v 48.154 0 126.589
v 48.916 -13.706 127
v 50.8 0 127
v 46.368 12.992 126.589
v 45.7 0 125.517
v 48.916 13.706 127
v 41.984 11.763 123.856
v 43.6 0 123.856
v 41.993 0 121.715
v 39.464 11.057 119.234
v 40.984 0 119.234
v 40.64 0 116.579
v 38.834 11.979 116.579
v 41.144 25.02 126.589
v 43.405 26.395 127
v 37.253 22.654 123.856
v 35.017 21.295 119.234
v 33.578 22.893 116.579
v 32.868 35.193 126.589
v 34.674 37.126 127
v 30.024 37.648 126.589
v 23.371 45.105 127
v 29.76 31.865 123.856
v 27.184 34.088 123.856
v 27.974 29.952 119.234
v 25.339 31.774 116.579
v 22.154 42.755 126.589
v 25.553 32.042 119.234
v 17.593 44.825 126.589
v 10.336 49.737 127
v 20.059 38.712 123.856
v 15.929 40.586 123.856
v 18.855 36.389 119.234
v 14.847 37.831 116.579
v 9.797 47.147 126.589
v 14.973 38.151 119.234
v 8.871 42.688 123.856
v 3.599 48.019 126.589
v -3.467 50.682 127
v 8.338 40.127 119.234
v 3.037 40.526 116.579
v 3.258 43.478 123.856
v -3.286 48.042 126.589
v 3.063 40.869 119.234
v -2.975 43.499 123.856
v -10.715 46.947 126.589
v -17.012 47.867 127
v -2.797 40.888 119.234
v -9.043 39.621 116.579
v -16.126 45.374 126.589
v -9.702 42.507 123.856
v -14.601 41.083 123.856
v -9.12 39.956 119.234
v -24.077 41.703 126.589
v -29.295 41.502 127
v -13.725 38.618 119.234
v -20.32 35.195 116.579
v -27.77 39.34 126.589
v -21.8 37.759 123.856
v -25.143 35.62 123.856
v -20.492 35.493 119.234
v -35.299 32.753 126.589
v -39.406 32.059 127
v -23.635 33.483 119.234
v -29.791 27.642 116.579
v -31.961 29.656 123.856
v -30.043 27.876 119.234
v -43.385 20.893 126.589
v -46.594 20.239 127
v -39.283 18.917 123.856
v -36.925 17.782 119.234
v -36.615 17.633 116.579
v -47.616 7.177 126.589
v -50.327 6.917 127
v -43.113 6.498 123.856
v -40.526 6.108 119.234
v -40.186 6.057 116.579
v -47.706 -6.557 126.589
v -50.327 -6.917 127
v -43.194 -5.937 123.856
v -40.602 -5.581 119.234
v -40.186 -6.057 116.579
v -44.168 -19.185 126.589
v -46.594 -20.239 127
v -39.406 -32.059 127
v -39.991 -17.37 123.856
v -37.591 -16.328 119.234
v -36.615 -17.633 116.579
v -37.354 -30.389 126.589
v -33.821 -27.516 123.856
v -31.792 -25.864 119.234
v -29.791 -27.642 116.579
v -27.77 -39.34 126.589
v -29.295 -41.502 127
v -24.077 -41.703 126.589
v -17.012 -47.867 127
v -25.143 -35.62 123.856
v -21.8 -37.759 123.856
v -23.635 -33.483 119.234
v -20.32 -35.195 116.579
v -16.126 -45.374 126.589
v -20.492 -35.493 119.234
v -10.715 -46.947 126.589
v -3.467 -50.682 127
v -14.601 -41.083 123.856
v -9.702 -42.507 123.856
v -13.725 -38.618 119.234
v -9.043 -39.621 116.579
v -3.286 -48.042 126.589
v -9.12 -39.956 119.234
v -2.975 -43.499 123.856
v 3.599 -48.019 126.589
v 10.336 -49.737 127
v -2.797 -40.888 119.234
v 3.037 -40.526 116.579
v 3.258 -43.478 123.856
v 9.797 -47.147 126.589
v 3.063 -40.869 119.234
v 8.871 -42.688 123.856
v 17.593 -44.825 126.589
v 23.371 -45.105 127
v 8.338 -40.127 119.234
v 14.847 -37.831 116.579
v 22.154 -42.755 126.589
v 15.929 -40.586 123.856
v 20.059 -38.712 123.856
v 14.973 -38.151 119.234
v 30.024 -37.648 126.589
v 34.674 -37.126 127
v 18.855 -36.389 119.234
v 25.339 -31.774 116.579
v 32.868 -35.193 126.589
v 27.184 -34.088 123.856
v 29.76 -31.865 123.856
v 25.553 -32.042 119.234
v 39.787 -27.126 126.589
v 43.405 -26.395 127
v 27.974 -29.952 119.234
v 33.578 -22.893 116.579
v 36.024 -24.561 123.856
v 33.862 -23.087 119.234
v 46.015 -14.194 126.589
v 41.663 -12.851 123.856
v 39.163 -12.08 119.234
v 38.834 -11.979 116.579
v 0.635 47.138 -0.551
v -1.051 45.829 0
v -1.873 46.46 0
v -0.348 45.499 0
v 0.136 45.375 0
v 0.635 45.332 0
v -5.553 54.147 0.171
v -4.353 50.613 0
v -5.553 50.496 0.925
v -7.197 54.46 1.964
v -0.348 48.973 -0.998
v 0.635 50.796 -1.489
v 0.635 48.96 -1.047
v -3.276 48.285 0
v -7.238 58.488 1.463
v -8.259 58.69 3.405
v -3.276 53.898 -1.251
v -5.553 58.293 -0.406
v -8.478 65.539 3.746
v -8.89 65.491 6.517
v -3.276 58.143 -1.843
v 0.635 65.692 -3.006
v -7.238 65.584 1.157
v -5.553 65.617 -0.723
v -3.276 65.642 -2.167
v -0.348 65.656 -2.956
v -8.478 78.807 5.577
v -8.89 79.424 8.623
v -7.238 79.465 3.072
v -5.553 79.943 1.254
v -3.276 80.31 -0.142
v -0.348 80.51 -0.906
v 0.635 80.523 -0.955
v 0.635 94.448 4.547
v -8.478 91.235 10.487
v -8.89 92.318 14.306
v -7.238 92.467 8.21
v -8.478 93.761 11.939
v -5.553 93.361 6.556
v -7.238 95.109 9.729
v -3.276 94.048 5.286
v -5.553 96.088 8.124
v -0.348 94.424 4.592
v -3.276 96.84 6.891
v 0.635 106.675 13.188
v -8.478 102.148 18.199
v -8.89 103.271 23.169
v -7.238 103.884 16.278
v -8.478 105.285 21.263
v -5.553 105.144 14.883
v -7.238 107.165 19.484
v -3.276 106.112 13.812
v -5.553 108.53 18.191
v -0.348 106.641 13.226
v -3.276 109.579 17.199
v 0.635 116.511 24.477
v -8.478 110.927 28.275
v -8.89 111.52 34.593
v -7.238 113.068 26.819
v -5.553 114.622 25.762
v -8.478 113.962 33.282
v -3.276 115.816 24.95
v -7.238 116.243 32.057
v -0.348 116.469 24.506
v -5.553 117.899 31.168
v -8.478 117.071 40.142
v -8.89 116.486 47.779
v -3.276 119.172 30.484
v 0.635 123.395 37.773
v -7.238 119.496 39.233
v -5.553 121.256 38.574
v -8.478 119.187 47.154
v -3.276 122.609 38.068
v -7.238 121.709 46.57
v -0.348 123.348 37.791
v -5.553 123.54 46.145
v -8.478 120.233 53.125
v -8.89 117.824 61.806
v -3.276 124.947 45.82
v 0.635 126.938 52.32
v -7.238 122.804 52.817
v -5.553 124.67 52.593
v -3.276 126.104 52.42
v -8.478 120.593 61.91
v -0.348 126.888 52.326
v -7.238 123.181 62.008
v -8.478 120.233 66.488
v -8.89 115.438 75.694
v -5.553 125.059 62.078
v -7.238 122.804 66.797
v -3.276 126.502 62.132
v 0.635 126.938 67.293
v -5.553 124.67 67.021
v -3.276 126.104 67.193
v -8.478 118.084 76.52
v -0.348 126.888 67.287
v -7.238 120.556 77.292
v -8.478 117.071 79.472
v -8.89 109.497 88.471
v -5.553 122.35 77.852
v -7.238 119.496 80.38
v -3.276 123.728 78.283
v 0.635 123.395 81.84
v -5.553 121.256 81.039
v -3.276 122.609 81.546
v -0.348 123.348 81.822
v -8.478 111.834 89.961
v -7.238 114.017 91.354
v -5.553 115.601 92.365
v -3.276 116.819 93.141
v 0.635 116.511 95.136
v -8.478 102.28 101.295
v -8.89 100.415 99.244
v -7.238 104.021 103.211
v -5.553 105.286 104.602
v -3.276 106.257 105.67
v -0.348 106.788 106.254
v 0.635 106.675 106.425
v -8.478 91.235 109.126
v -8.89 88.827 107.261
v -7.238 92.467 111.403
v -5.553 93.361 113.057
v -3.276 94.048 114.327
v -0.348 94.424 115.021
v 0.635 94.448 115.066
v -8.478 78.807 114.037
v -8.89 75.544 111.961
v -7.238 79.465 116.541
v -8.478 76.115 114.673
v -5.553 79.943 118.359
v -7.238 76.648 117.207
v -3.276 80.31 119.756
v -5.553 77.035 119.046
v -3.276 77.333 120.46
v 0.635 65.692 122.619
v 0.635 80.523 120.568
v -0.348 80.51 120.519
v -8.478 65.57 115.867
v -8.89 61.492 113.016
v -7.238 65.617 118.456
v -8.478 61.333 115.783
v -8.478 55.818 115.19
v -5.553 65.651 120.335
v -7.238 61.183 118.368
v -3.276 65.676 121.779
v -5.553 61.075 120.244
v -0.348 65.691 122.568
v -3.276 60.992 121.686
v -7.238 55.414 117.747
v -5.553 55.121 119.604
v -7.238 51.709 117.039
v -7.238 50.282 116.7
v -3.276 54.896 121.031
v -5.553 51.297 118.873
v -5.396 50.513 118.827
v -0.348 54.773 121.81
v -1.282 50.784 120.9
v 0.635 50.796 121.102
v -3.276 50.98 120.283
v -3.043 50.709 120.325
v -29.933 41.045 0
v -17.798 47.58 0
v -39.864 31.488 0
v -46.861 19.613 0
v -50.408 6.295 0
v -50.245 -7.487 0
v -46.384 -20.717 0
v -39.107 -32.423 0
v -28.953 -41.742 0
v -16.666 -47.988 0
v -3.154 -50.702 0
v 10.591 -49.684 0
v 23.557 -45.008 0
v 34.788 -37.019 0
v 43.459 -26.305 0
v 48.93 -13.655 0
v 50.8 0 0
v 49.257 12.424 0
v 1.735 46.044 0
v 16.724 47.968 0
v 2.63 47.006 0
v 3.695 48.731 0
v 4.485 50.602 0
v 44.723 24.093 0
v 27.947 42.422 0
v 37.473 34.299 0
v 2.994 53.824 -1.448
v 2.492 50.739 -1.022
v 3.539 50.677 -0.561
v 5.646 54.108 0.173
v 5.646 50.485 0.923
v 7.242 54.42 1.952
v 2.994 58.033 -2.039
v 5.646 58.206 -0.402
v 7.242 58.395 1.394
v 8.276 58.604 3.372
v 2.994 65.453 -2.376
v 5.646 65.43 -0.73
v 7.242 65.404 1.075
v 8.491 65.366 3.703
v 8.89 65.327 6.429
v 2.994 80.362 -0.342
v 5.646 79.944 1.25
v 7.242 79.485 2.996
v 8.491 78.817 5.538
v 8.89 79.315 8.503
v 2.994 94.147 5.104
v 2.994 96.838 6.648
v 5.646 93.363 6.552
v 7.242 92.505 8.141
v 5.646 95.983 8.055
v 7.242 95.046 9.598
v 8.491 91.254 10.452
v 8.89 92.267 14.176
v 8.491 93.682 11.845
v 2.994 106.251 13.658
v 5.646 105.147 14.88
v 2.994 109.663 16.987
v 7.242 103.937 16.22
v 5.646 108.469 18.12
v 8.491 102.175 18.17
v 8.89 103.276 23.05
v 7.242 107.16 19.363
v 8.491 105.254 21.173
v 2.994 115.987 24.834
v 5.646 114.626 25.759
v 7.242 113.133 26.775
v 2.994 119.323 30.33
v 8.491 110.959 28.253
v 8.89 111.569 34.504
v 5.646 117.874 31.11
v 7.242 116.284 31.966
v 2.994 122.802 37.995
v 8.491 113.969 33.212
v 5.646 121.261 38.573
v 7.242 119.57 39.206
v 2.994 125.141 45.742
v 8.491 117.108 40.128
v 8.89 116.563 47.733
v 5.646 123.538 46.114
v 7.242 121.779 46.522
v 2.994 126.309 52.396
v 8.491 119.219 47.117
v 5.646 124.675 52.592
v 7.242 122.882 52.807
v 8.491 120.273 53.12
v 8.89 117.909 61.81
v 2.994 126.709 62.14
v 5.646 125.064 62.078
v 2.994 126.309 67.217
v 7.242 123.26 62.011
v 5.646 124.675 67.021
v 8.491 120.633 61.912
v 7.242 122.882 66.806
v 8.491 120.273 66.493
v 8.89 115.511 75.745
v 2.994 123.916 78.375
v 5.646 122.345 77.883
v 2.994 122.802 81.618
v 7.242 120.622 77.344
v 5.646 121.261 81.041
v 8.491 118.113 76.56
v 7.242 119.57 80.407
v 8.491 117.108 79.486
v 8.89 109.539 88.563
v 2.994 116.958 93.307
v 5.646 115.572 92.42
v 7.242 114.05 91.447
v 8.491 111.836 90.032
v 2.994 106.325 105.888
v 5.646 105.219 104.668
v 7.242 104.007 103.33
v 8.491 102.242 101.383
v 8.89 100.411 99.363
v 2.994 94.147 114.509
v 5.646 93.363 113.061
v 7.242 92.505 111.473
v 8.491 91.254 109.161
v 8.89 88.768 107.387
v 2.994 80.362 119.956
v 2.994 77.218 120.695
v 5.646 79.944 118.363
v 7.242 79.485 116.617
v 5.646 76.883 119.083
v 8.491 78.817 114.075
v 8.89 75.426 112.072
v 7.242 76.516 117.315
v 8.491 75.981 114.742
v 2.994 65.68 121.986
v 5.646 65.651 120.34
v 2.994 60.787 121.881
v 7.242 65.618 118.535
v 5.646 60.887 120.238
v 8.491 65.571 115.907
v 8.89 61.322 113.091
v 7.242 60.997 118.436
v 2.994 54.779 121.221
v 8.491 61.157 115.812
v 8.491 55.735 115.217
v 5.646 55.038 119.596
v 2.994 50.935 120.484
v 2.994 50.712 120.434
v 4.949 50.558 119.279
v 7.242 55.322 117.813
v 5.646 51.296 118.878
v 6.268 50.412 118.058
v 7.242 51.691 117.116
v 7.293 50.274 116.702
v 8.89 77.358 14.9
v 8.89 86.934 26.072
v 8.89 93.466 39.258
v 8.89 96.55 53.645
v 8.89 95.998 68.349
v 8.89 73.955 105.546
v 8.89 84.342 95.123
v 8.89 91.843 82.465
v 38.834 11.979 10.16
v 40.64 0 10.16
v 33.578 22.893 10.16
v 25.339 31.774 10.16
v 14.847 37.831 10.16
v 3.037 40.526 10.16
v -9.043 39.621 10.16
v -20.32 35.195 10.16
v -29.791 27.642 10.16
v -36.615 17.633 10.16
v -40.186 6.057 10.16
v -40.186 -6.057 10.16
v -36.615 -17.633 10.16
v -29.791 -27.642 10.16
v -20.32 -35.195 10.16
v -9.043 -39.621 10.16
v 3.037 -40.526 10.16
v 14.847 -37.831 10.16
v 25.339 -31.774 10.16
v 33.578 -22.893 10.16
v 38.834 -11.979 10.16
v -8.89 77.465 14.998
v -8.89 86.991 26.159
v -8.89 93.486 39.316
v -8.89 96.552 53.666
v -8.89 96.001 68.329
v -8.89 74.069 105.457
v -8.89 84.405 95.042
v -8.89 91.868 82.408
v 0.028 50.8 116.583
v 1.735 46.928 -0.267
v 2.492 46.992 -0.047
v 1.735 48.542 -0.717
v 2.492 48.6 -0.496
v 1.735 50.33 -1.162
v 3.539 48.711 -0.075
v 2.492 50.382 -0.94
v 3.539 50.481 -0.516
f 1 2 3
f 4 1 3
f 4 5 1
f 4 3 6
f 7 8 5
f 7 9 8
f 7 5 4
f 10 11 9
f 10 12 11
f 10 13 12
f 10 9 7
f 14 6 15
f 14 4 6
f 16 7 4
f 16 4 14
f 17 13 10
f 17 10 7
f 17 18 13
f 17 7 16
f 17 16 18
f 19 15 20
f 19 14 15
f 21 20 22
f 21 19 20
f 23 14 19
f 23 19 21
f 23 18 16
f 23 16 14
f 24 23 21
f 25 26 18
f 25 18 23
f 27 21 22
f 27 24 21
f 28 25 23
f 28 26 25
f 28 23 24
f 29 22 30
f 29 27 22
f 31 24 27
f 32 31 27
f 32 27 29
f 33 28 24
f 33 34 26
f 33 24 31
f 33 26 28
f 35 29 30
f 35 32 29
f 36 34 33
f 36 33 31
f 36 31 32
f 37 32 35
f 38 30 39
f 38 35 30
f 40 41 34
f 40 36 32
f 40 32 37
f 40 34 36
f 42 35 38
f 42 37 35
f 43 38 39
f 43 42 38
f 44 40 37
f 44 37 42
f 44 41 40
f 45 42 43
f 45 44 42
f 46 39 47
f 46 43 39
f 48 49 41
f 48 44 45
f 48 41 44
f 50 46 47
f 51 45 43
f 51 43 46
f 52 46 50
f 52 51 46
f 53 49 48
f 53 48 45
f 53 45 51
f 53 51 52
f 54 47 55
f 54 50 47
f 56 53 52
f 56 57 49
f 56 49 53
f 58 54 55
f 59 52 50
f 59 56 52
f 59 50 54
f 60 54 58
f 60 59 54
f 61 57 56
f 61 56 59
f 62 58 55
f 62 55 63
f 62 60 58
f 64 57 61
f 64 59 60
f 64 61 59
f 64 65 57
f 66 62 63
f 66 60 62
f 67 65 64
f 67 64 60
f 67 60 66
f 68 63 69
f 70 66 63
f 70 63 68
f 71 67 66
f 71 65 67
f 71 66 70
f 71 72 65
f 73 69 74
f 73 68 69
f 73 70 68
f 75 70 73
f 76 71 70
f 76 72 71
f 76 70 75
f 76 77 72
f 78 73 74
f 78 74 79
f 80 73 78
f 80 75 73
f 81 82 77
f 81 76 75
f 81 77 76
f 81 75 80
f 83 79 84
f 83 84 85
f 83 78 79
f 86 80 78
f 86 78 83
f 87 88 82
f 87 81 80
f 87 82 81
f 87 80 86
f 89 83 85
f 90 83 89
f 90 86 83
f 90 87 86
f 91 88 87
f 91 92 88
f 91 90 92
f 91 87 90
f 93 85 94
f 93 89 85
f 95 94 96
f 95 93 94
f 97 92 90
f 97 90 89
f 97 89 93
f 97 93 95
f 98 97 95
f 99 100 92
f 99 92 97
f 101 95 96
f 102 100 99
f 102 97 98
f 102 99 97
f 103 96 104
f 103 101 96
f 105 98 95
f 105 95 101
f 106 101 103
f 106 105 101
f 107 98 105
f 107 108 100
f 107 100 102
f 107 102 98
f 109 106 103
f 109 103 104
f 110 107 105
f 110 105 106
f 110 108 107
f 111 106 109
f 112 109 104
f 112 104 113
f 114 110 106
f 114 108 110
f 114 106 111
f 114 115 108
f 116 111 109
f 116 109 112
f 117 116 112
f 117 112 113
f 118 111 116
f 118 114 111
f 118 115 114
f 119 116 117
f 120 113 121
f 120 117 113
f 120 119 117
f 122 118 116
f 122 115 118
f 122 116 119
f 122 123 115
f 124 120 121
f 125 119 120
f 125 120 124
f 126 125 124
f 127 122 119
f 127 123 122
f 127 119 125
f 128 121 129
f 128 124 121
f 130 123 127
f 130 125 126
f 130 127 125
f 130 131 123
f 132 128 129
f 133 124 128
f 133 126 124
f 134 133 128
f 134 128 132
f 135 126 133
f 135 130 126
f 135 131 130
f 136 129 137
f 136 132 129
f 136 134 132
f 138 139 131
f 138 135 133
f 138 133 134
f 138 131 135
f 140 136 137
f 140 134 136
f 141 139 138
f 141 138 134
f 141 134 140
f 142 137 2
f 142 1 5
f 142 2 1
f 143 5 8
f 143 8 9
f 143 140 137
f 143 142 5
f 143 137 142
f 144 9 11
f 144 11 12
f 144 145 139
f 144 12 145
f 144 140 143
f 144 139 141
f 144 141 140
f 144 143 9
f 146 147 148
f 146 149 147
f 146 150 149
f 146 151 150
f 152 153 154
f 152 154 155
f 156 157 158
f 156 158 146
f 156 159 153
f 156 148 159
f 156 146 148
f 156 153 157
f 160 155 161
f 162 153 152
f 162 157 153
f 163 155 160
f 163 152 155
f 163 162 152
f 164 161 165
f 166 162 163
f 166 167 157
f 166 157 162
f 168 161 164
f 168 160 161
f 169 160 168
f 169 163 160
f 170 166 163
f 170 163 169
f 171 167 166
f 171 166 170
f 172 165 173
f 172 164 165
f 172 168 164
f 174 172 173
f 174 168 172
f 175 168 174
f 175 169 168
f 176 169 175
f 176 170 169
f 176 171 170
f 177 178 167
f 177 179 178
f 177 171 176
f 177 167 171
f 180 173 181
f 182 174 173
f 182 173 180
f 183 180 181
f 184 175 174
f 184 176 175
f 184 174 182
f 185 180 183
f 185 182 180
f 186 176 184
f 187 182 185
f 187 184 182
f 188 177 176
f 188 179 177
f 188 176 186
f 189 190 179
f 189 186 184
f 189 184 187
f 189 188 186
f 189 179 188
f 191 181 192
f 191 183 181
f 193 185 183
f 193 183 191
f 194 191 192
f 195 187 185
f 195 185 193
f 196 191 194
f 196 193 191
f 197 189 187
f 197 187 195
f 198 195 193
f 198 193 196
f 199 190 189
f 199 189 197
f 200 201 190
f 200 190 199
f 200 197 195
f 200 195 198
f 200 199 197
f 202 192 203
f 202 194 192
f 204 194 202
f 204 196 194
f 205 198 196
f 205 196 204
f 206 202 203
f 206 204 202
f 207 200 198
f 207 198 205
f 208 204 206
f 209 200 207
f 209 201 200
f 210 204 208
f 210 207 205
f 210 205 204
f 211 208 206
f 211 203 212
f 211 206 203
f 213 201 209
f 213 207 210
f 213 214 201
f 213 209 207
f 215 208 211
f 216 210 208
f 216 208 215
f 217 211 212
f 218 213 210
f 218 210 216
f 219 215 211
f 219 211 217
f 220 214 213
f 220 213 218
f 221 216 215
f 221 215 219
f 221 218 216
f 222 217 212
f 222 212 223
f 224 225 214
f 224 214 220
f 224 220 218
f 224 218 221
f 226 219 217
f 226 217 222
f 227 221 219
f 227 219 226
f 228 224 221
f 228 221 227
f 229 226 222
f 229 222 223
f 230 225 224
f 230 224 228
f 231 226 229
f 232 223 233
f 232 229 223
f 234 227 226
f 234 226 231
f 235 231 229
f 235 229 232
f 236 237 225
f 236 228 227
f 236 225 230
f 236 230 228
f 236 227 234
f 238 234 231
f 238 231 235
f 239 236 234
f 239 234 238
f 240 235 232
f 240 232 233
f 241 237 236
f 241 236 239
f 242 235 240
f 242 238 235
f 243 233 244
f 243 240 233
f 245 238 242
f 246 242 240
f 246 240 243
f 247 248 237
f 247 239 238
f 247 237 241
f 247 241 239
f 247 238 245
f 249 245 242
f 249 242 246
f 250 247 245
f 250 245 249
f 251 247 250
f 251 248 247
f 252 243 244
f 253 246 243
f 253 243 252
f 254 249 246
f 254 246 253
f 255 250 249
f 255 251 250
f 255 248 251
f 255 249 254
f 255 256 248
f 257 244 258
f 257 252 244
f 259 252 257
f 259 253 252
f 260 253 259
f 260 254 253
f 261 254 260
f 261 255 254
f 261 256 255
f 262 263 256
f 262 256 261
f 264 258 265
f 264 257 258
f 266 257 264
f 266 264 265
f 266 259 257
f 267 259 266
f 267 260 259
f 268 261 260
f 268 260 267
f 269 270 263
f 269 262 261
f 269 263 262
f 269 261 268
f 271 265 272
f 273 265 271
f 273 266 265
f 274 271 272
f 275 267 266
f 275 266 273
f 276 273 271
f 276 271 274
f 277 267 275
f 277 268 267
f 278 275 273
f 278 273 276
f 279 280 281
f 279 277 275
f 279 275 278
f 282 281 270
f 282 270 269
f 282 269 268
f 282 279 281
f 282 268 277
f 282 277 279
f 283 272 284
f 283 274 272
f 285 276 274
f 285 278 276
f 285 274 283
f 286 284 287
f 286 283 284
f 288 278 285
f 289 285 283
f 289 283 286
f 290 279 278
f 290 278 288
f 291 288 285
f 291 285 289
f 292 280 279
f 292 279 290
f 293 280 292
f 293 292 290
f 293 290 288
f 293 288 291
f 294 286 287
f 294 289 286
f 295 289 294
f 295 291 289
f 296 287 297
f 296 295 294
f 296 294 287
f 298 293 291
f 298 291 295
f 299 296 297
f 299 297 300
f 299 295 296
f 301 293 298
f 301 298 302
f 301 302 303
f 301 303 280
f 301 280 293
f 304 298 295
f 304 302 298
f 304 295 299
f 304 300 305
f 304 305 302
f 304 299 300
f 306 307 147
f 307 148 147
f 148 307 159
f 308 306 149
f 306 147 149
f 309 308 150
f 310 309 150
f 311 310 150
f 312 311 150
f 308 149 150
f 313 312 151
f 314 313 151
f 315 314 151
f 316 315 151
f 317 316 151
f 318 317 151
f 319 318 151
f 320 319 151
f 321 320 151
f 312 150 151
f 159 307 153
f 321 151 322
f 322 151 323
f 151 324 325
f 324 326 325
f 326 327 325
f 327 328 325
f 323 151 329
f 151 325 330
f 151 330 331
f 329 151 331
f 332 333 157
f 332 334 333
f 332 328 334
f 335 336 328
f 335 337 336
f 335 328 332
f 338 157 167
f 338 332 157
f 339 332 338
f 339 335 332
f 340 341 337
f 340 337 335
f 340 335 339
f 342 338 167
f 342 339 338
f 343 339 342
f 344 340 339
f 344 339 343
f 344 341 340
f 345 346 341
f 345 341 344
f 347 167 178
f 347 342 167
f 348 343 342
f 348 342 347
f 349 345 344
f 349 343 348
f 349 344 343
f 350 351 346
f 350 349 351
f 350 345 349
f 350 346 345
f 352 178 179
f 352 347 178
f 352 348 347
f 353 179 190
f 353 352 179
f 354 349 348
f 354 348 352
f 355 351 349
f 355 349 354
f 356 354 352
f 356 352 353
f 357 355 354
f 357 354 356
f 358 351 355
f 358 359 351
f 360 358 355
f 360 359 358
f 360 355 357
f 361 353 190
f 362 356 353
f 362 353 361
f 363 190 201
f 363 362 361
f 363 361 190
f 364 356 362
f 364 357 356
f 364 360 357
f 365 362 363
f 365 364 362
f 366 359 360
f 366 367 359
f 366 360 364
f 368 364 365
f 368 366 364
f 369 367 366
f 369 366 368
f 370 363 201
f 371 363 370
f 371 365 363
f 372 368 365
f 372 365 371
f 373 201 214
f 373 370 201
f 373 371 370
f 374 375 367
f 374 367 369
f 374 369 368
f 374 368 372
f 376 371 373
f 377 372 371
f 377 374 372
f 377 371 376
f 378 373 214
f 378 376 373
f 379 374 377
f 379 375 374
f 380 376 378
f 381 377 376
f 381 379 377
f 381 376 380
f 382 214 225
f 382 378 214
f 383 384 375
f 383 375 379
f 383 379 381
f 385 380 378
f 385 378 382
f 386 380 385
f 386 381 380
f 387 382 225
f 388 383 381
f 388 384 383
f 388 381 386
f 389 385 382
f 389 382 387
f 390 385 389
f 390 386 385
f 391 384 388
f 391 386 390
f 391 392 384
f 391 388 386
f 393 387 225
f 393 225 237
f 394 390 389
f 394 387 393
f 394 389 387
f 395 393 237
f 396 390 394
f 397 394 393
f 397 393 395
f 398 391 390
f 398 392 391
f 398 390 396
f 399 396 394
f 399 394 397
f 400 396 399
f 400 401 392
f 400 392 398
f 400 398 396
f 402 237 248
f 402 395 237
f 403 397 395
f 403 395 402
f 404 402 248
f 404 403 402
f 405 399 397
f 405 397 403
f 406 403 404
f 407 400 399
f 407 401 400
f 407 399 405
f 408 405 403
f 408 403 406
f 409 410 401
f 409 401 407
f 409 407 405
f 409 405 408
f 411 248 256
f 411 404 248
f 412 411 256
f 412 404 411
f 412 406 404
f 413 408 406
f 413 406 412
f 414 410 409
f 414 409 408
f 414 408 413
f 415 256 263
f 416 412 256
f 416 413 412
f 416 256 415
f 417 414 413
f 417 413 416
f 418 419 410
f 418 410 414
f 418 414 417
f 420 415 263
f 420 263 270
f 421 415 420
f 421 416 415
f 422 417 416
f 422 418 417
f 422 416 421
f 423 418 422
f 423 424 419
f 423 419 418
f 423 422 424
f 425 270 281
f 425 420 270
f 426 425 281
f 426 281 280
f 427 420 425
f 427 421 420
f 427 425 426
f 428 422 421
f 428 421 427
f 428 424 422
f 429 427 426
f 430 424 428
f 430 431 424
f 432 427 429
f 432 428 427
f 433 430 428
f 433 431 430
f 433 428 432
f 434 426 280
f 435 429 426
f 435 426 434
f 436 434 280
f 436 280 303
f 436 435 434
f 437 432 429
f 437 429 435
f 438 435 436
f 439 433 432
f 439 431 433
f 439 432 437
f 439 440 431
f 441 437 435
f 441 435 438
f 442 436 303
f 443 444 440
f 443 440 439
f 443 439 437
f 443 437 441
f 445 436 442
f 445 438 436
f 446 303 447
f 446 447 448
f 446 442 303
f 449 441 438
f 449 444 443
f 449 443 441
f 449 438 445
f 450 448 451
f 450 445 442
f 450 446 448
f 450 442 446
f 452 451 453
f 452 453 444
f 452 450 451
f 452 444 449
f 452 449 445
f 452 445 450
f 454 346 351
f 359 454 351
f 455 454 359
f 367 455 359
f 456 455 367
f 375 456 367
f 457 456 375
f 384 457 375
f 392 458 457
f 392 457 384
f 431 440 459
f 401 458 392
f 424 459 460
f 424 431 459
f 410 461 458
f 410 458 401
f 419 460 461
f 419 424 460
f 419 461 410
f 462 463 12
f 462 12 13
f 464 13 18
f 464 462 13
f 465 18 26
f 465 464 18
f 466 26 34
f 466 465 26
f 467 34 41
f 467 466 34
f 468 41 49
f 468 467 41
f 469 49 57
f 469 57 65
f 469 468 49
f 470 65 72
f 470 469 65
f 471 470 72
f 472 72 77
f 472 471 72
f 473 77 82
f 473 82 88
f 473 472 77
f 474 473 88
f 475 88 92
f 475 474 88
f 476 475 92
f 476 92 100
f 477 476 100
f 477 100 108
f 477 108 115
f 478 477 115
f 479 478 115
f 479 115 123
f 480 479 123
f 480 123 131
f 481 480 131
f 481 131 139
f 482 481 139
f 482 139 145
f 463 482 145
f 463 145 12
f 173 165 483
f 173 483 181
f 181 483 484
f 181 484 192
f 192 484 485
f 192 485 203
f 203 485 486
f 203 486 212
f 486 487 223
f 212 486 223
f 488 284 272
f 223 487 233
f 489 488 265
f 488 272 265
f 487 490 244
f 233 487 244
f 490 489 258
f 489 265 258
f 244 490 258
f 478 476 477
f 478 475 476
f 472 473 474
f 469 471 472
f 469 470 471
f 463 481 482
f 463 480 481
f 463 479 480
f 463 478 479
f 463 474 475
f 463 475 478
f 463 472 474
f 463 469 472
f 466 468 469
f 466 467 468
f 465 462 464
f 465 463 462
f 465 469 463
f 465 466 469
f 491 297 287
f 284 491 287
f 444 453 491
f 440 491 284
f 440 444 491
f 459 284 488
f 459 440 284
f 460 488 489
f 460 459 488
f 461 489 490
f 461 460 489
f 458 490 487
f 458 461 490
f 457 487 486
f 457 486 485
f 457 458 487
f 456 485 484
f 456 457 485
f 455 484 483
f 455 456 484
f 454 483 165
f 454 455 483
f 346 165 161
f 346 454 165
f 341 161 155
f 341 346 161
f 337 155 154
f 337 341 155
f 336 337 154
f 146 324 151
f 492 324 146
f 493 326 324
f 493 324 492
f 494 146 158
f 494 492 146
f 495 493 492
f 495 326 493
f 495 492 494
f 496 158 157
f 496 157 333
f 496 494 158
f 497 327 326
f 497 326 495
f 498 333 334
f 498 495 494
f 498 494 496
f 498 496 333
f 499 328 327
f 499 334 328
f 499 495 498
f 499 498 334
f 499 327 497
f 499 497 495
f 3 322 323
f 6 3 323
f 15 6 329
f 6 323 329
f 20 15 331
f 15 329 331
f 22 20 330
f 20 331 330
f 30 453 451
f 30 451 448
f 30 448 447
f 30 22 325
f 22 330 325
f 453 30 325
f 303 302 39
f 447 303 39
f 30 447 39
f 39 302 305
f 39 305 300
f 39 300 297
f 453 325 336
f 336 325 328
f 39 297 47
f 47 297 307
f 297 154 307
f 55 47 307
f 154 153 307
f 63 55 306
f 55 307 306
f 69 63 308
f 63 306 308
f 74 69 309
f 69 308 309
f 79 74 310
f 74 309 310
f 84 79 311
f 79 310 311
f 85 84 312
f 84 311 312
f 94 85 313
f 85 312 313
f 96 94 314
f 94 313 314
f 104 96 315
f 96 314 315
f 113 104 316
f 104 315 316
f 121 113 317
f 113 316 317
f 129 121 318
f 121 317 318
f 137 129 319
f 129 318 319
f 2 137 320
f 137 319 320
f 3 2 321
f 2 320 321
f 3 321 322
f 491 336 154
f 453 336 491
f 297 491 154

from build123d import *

# Parameters (mm, degrees)
F0_R         = 50.8
F1_DEPTH     = 127
F2_T         = -10.16
F5_DEPTH     = 8.89
F6_T4_ANGLE  = 254.7462790776
F6_S5_R      = 50.8
F6_T6_DEPTH  = 89
F6_T11_ANGLE = 254.7462790776
F6_S12_R     = 50.8
F6_T13_DEPTH = 89
F6_T18_ANGLE = 254.7462790776
F6_S19_R     = 50.8
F6_T20_DEPTH = 89
F7_T4_ANGLE  = 254.3575983754
F7_S5_R      = 50.8
F7_T6_DEPTH  = 89
F7_T10_ANGLE = 254.3575983754


# Not quite as in the source:
# - a fillet or chamfer that OpenCascade refuses, or shapes differently, is made with other operations: its cross-section is extruded or revolved along the edge and cut away or added


with BuildPart() as f1:
    # F0 (on Top) → F1 (new body)
    with BuildSketch(Plane.XY):
        Circle(F0_R)
    extrude(amount=F1_DEPTH)

    # F2
    f2_openings = [f1.faces().sort_by_distance(p)[0] for p in [
        (0, 0, 127),
    ]]
    offset(amount=F2_T, openings=f2_openings)

    # F3: fillet of radius 10.4245741623 on 1 edges, made by hand

    # F3_s1 → F3_t2 (revolve, cut)
    with BuildSketch(Plane.XZ):
        with BuildLine():
            ThreePointArc((50.8, 127), (43.6003320895, 123.8559286261), (40.64, 116.5787838052))
            Line((40.64, 116.5787838052), (40.64, 127))
            Line((40.64, 127), (50.8, 127))
        make_face()
    revolve(axis=Axis((0, 0, 127), (0, 0, 1)), mode=Mode.SUBTRACT)

    # F4 (on Right) → F5 (join, symmetric)
    with BuildSketch(Plane.YZ):
        with BuildLine():
            ThreePointArc((40.9011468769, 118.0027031276), (96.7316605485, 61.0144931984), (45.3319139779, 0))
            ThreePointArc((45.3319139779, 0), (127.3418829144, 62.1638462438), (40.9011468769, 118.0027031276))
        make_face()
    extrude(amount=F5_DEPTH, both=True)

    # F6: fillet of radius 9.525 on 1 edges, made by hand


with BuildPart() as f6_tool2:
    # F6_s3 → F6_t4 (revolve)
    with BuildSketch(Plane(origin=(0, 8.968139316, -7.4168504874), x_dir=(1, 0, 0), z_dir=(0, -0.7706077503, 0.6373097325))):
        with BuildLine():
            ThreePointArc((-8.89, 33.9367221949), (-6.1001920908, 27.2015301041), (0.635, 24.4117221949))
            Line((0.635, 24.4117221949), (-8.89, 24.4117221949))
            Line((-8.89, 24.4117221949), (-8.89, 33.9367221949))
        make_face()
    revolve(axis=Axis((-8.89, 64.5634606481, 59.8066411912), (1, 0, 0)), revolution_arc=F6_T4_ANGLE)

    # F6_s5 → F6_t6 (intersect, symmetric)
    with BuildSketch(Plane.XY.offset(59.8)):
        Circle(F6_S5_R)
    extrude(amount=F6_T6_DEPTH, both=True, mode=Mode.INTERSECT)

    split(bisect_by=Plane.XY, keep=Keep.BOTTOM)


with BuildPart() as f1_1:
    add(f1.part)

    # F6_t1: cut F6_tool2
    add(f6_tool2.part, mode=Mode.SUBTRACT)


with BuildPart() as f6_tool9:
    # F6_s10 → F6_t11 (revolve)
    with BuildSketch(Plane(origin=(0, 8.968139316, -7.4168504874), x_dir=(1, 0, 0), z_dir=(0, -0.7706077503, 0.6373097325))):
        with BuildLine():
            ThreePointArc((-8.89, 33.9367221949), (-6.1001920908, 27.2015301041), (0.635, 24.4117221949))
            Line((0.635, 24.4117221949), (-8.89, 24.4117221949))
            Line((-8.89, 24.4117221949), (-8.89, 33.9367221949))
        make_face()
    revolve(axis=Axis((-8.89, 64.5634606481, 59.8066411912), (1, 0, 0)), revolution_arc=F6_T11_ANGLE)

    # F6_s12 → F6_t13 (cut, symmetric)
    with BuildSketch(Plane.XY.offset(59.8)):
        Circle(F6_S12_R)
    extrude(amount=F6_T13_DEPTH, both=True, mode=Mode.SUBTRACT)

    split(bisect_by=Plane.XY, keep=Keep.TOP)


with BuildPart() as f1_2:
    add(f1_1.part)

    # F6_t8: cut F6_tool9
    add(f6_tool9.part, mode=Mode.SUBTRACT)


with BuildPart() as f6_tool16:
    # F6_s17 → F6_t18 (revolve)
    with BuildSketch(Plane(origin=(0, 8.968139316, -7.4168504874), x_dir=(1, 0, 0), z_dir=(0, -0.7706077503, 0.6373097325))):
        with BuildLine():
            ThreePointArc((-8.89, 33.9367221949), (-6.1001920908, 27.2015301041), (0.635, 24.4117221949))
            Line((0.635, 24.4117221949), (-8.89, 24.4117221949))
            Line((-8.89, 24.4117221949), (-8.89, 33.9367221949))
        make_face()
    revolve(axis=Axis((-8.89, 64.5634606481, 59.8066411912), (1, 0, 0)), revolution_arc=F6_T18_ANGLE)

    # F6_s19 → F6_t20 (cut, symmetric)
    with BuildSketch(Plane.XY.offset(59.8)):
        Circle(F6_S19_R)
    extrude(amount=F6_T20_DEPTH, both=True, mode=Mode.SUBTRACT)

    split(bisect_by=Plane.XY, keep=Keep.BOTTOM)


with BuildPart() as f1_3:
    add(f1_2.part)

    # F6_t15: cut F6_tool16
    add(f6_tool16.part, mode=Mode.SUBTRACT)

    # F7: fillet of radius 9.525 on 1 edges, made by hand


with BuildPart() as f7_tool2:
    # F7_s3 → F7_t4 (revolve)
    with BuildSketch(Plane(origin=(0, 9.2218448194, -7.5741443116), x_dir=(1, 0, 0), z_dir=(0, -0.7727649908, 0.6346922632))):
        with BuildLine():
            ThreePointArc((0.635, 24.3717466269), (6.5351595171, 27.541577675), (8.89, 33.8117002814))
            Line((8.89, 33.8117002814), (8.89, 24.3717466269))
            Line((8.89, 24.3717466269), (0.635, 24.3717466269))
        make_face()
    revolve(axis=Axis((8.89, 64.5634606481, 59.8066411912), (1, 0, 0)), revolution_arc=F7_T4_ANGLE)

    # F7_s5 → F7_t6 (cut, symmetric)
    with BuildSketch(Plane.XY.offset(59.8)):
        Circle(F7_S5_R)
    extrude(amount=F7_T6_DEPTH, both=True, mode=Mode.SUBTRACT)


with BuildPart() as f1_4:
    add(f1_3.part)

    # F7_t1: cut F7_tool2
    add(f7_tool2.part, mode=Mode.SUBTRACT)


with BuildPart() as f7_tool8:
    # F7_s9 → F7_t10 (revolve)
    with BuildSketch(Plane(origin=(0, 9.2218448194, -7.5741443116), x_dir=(1, 0, 0), z_dir=(0, -0.7727649908, 0.6346922632))):
        with BuildLine():
            ThreePointArc((0.635, 24.3717466269), (6.5351595171, 27.541577675), (8.89, 33.8117002814))
            Line((8.89, 33.8117002814), (8.89, 24.3717466269))
            Line((8.89, 24.3717466269), (0.635, 24.3717466269))
        make_face()
    revolve(axis=Axis((8.89, 64.5634606481, 59.8066411912), (1, 0, 0)), revolution_arc=F7_T10_ANGLE)

    split(bisect_by=Plane.XY, keep=Keep.BOTTOM)


with BuildPart() as f1_5:
    add(f1_4.part)

    # F7_t7: cut F7_tool8
    add(f7_tool8.part, mode=Mode.SUBTRACT)


solid = f1_5.part
